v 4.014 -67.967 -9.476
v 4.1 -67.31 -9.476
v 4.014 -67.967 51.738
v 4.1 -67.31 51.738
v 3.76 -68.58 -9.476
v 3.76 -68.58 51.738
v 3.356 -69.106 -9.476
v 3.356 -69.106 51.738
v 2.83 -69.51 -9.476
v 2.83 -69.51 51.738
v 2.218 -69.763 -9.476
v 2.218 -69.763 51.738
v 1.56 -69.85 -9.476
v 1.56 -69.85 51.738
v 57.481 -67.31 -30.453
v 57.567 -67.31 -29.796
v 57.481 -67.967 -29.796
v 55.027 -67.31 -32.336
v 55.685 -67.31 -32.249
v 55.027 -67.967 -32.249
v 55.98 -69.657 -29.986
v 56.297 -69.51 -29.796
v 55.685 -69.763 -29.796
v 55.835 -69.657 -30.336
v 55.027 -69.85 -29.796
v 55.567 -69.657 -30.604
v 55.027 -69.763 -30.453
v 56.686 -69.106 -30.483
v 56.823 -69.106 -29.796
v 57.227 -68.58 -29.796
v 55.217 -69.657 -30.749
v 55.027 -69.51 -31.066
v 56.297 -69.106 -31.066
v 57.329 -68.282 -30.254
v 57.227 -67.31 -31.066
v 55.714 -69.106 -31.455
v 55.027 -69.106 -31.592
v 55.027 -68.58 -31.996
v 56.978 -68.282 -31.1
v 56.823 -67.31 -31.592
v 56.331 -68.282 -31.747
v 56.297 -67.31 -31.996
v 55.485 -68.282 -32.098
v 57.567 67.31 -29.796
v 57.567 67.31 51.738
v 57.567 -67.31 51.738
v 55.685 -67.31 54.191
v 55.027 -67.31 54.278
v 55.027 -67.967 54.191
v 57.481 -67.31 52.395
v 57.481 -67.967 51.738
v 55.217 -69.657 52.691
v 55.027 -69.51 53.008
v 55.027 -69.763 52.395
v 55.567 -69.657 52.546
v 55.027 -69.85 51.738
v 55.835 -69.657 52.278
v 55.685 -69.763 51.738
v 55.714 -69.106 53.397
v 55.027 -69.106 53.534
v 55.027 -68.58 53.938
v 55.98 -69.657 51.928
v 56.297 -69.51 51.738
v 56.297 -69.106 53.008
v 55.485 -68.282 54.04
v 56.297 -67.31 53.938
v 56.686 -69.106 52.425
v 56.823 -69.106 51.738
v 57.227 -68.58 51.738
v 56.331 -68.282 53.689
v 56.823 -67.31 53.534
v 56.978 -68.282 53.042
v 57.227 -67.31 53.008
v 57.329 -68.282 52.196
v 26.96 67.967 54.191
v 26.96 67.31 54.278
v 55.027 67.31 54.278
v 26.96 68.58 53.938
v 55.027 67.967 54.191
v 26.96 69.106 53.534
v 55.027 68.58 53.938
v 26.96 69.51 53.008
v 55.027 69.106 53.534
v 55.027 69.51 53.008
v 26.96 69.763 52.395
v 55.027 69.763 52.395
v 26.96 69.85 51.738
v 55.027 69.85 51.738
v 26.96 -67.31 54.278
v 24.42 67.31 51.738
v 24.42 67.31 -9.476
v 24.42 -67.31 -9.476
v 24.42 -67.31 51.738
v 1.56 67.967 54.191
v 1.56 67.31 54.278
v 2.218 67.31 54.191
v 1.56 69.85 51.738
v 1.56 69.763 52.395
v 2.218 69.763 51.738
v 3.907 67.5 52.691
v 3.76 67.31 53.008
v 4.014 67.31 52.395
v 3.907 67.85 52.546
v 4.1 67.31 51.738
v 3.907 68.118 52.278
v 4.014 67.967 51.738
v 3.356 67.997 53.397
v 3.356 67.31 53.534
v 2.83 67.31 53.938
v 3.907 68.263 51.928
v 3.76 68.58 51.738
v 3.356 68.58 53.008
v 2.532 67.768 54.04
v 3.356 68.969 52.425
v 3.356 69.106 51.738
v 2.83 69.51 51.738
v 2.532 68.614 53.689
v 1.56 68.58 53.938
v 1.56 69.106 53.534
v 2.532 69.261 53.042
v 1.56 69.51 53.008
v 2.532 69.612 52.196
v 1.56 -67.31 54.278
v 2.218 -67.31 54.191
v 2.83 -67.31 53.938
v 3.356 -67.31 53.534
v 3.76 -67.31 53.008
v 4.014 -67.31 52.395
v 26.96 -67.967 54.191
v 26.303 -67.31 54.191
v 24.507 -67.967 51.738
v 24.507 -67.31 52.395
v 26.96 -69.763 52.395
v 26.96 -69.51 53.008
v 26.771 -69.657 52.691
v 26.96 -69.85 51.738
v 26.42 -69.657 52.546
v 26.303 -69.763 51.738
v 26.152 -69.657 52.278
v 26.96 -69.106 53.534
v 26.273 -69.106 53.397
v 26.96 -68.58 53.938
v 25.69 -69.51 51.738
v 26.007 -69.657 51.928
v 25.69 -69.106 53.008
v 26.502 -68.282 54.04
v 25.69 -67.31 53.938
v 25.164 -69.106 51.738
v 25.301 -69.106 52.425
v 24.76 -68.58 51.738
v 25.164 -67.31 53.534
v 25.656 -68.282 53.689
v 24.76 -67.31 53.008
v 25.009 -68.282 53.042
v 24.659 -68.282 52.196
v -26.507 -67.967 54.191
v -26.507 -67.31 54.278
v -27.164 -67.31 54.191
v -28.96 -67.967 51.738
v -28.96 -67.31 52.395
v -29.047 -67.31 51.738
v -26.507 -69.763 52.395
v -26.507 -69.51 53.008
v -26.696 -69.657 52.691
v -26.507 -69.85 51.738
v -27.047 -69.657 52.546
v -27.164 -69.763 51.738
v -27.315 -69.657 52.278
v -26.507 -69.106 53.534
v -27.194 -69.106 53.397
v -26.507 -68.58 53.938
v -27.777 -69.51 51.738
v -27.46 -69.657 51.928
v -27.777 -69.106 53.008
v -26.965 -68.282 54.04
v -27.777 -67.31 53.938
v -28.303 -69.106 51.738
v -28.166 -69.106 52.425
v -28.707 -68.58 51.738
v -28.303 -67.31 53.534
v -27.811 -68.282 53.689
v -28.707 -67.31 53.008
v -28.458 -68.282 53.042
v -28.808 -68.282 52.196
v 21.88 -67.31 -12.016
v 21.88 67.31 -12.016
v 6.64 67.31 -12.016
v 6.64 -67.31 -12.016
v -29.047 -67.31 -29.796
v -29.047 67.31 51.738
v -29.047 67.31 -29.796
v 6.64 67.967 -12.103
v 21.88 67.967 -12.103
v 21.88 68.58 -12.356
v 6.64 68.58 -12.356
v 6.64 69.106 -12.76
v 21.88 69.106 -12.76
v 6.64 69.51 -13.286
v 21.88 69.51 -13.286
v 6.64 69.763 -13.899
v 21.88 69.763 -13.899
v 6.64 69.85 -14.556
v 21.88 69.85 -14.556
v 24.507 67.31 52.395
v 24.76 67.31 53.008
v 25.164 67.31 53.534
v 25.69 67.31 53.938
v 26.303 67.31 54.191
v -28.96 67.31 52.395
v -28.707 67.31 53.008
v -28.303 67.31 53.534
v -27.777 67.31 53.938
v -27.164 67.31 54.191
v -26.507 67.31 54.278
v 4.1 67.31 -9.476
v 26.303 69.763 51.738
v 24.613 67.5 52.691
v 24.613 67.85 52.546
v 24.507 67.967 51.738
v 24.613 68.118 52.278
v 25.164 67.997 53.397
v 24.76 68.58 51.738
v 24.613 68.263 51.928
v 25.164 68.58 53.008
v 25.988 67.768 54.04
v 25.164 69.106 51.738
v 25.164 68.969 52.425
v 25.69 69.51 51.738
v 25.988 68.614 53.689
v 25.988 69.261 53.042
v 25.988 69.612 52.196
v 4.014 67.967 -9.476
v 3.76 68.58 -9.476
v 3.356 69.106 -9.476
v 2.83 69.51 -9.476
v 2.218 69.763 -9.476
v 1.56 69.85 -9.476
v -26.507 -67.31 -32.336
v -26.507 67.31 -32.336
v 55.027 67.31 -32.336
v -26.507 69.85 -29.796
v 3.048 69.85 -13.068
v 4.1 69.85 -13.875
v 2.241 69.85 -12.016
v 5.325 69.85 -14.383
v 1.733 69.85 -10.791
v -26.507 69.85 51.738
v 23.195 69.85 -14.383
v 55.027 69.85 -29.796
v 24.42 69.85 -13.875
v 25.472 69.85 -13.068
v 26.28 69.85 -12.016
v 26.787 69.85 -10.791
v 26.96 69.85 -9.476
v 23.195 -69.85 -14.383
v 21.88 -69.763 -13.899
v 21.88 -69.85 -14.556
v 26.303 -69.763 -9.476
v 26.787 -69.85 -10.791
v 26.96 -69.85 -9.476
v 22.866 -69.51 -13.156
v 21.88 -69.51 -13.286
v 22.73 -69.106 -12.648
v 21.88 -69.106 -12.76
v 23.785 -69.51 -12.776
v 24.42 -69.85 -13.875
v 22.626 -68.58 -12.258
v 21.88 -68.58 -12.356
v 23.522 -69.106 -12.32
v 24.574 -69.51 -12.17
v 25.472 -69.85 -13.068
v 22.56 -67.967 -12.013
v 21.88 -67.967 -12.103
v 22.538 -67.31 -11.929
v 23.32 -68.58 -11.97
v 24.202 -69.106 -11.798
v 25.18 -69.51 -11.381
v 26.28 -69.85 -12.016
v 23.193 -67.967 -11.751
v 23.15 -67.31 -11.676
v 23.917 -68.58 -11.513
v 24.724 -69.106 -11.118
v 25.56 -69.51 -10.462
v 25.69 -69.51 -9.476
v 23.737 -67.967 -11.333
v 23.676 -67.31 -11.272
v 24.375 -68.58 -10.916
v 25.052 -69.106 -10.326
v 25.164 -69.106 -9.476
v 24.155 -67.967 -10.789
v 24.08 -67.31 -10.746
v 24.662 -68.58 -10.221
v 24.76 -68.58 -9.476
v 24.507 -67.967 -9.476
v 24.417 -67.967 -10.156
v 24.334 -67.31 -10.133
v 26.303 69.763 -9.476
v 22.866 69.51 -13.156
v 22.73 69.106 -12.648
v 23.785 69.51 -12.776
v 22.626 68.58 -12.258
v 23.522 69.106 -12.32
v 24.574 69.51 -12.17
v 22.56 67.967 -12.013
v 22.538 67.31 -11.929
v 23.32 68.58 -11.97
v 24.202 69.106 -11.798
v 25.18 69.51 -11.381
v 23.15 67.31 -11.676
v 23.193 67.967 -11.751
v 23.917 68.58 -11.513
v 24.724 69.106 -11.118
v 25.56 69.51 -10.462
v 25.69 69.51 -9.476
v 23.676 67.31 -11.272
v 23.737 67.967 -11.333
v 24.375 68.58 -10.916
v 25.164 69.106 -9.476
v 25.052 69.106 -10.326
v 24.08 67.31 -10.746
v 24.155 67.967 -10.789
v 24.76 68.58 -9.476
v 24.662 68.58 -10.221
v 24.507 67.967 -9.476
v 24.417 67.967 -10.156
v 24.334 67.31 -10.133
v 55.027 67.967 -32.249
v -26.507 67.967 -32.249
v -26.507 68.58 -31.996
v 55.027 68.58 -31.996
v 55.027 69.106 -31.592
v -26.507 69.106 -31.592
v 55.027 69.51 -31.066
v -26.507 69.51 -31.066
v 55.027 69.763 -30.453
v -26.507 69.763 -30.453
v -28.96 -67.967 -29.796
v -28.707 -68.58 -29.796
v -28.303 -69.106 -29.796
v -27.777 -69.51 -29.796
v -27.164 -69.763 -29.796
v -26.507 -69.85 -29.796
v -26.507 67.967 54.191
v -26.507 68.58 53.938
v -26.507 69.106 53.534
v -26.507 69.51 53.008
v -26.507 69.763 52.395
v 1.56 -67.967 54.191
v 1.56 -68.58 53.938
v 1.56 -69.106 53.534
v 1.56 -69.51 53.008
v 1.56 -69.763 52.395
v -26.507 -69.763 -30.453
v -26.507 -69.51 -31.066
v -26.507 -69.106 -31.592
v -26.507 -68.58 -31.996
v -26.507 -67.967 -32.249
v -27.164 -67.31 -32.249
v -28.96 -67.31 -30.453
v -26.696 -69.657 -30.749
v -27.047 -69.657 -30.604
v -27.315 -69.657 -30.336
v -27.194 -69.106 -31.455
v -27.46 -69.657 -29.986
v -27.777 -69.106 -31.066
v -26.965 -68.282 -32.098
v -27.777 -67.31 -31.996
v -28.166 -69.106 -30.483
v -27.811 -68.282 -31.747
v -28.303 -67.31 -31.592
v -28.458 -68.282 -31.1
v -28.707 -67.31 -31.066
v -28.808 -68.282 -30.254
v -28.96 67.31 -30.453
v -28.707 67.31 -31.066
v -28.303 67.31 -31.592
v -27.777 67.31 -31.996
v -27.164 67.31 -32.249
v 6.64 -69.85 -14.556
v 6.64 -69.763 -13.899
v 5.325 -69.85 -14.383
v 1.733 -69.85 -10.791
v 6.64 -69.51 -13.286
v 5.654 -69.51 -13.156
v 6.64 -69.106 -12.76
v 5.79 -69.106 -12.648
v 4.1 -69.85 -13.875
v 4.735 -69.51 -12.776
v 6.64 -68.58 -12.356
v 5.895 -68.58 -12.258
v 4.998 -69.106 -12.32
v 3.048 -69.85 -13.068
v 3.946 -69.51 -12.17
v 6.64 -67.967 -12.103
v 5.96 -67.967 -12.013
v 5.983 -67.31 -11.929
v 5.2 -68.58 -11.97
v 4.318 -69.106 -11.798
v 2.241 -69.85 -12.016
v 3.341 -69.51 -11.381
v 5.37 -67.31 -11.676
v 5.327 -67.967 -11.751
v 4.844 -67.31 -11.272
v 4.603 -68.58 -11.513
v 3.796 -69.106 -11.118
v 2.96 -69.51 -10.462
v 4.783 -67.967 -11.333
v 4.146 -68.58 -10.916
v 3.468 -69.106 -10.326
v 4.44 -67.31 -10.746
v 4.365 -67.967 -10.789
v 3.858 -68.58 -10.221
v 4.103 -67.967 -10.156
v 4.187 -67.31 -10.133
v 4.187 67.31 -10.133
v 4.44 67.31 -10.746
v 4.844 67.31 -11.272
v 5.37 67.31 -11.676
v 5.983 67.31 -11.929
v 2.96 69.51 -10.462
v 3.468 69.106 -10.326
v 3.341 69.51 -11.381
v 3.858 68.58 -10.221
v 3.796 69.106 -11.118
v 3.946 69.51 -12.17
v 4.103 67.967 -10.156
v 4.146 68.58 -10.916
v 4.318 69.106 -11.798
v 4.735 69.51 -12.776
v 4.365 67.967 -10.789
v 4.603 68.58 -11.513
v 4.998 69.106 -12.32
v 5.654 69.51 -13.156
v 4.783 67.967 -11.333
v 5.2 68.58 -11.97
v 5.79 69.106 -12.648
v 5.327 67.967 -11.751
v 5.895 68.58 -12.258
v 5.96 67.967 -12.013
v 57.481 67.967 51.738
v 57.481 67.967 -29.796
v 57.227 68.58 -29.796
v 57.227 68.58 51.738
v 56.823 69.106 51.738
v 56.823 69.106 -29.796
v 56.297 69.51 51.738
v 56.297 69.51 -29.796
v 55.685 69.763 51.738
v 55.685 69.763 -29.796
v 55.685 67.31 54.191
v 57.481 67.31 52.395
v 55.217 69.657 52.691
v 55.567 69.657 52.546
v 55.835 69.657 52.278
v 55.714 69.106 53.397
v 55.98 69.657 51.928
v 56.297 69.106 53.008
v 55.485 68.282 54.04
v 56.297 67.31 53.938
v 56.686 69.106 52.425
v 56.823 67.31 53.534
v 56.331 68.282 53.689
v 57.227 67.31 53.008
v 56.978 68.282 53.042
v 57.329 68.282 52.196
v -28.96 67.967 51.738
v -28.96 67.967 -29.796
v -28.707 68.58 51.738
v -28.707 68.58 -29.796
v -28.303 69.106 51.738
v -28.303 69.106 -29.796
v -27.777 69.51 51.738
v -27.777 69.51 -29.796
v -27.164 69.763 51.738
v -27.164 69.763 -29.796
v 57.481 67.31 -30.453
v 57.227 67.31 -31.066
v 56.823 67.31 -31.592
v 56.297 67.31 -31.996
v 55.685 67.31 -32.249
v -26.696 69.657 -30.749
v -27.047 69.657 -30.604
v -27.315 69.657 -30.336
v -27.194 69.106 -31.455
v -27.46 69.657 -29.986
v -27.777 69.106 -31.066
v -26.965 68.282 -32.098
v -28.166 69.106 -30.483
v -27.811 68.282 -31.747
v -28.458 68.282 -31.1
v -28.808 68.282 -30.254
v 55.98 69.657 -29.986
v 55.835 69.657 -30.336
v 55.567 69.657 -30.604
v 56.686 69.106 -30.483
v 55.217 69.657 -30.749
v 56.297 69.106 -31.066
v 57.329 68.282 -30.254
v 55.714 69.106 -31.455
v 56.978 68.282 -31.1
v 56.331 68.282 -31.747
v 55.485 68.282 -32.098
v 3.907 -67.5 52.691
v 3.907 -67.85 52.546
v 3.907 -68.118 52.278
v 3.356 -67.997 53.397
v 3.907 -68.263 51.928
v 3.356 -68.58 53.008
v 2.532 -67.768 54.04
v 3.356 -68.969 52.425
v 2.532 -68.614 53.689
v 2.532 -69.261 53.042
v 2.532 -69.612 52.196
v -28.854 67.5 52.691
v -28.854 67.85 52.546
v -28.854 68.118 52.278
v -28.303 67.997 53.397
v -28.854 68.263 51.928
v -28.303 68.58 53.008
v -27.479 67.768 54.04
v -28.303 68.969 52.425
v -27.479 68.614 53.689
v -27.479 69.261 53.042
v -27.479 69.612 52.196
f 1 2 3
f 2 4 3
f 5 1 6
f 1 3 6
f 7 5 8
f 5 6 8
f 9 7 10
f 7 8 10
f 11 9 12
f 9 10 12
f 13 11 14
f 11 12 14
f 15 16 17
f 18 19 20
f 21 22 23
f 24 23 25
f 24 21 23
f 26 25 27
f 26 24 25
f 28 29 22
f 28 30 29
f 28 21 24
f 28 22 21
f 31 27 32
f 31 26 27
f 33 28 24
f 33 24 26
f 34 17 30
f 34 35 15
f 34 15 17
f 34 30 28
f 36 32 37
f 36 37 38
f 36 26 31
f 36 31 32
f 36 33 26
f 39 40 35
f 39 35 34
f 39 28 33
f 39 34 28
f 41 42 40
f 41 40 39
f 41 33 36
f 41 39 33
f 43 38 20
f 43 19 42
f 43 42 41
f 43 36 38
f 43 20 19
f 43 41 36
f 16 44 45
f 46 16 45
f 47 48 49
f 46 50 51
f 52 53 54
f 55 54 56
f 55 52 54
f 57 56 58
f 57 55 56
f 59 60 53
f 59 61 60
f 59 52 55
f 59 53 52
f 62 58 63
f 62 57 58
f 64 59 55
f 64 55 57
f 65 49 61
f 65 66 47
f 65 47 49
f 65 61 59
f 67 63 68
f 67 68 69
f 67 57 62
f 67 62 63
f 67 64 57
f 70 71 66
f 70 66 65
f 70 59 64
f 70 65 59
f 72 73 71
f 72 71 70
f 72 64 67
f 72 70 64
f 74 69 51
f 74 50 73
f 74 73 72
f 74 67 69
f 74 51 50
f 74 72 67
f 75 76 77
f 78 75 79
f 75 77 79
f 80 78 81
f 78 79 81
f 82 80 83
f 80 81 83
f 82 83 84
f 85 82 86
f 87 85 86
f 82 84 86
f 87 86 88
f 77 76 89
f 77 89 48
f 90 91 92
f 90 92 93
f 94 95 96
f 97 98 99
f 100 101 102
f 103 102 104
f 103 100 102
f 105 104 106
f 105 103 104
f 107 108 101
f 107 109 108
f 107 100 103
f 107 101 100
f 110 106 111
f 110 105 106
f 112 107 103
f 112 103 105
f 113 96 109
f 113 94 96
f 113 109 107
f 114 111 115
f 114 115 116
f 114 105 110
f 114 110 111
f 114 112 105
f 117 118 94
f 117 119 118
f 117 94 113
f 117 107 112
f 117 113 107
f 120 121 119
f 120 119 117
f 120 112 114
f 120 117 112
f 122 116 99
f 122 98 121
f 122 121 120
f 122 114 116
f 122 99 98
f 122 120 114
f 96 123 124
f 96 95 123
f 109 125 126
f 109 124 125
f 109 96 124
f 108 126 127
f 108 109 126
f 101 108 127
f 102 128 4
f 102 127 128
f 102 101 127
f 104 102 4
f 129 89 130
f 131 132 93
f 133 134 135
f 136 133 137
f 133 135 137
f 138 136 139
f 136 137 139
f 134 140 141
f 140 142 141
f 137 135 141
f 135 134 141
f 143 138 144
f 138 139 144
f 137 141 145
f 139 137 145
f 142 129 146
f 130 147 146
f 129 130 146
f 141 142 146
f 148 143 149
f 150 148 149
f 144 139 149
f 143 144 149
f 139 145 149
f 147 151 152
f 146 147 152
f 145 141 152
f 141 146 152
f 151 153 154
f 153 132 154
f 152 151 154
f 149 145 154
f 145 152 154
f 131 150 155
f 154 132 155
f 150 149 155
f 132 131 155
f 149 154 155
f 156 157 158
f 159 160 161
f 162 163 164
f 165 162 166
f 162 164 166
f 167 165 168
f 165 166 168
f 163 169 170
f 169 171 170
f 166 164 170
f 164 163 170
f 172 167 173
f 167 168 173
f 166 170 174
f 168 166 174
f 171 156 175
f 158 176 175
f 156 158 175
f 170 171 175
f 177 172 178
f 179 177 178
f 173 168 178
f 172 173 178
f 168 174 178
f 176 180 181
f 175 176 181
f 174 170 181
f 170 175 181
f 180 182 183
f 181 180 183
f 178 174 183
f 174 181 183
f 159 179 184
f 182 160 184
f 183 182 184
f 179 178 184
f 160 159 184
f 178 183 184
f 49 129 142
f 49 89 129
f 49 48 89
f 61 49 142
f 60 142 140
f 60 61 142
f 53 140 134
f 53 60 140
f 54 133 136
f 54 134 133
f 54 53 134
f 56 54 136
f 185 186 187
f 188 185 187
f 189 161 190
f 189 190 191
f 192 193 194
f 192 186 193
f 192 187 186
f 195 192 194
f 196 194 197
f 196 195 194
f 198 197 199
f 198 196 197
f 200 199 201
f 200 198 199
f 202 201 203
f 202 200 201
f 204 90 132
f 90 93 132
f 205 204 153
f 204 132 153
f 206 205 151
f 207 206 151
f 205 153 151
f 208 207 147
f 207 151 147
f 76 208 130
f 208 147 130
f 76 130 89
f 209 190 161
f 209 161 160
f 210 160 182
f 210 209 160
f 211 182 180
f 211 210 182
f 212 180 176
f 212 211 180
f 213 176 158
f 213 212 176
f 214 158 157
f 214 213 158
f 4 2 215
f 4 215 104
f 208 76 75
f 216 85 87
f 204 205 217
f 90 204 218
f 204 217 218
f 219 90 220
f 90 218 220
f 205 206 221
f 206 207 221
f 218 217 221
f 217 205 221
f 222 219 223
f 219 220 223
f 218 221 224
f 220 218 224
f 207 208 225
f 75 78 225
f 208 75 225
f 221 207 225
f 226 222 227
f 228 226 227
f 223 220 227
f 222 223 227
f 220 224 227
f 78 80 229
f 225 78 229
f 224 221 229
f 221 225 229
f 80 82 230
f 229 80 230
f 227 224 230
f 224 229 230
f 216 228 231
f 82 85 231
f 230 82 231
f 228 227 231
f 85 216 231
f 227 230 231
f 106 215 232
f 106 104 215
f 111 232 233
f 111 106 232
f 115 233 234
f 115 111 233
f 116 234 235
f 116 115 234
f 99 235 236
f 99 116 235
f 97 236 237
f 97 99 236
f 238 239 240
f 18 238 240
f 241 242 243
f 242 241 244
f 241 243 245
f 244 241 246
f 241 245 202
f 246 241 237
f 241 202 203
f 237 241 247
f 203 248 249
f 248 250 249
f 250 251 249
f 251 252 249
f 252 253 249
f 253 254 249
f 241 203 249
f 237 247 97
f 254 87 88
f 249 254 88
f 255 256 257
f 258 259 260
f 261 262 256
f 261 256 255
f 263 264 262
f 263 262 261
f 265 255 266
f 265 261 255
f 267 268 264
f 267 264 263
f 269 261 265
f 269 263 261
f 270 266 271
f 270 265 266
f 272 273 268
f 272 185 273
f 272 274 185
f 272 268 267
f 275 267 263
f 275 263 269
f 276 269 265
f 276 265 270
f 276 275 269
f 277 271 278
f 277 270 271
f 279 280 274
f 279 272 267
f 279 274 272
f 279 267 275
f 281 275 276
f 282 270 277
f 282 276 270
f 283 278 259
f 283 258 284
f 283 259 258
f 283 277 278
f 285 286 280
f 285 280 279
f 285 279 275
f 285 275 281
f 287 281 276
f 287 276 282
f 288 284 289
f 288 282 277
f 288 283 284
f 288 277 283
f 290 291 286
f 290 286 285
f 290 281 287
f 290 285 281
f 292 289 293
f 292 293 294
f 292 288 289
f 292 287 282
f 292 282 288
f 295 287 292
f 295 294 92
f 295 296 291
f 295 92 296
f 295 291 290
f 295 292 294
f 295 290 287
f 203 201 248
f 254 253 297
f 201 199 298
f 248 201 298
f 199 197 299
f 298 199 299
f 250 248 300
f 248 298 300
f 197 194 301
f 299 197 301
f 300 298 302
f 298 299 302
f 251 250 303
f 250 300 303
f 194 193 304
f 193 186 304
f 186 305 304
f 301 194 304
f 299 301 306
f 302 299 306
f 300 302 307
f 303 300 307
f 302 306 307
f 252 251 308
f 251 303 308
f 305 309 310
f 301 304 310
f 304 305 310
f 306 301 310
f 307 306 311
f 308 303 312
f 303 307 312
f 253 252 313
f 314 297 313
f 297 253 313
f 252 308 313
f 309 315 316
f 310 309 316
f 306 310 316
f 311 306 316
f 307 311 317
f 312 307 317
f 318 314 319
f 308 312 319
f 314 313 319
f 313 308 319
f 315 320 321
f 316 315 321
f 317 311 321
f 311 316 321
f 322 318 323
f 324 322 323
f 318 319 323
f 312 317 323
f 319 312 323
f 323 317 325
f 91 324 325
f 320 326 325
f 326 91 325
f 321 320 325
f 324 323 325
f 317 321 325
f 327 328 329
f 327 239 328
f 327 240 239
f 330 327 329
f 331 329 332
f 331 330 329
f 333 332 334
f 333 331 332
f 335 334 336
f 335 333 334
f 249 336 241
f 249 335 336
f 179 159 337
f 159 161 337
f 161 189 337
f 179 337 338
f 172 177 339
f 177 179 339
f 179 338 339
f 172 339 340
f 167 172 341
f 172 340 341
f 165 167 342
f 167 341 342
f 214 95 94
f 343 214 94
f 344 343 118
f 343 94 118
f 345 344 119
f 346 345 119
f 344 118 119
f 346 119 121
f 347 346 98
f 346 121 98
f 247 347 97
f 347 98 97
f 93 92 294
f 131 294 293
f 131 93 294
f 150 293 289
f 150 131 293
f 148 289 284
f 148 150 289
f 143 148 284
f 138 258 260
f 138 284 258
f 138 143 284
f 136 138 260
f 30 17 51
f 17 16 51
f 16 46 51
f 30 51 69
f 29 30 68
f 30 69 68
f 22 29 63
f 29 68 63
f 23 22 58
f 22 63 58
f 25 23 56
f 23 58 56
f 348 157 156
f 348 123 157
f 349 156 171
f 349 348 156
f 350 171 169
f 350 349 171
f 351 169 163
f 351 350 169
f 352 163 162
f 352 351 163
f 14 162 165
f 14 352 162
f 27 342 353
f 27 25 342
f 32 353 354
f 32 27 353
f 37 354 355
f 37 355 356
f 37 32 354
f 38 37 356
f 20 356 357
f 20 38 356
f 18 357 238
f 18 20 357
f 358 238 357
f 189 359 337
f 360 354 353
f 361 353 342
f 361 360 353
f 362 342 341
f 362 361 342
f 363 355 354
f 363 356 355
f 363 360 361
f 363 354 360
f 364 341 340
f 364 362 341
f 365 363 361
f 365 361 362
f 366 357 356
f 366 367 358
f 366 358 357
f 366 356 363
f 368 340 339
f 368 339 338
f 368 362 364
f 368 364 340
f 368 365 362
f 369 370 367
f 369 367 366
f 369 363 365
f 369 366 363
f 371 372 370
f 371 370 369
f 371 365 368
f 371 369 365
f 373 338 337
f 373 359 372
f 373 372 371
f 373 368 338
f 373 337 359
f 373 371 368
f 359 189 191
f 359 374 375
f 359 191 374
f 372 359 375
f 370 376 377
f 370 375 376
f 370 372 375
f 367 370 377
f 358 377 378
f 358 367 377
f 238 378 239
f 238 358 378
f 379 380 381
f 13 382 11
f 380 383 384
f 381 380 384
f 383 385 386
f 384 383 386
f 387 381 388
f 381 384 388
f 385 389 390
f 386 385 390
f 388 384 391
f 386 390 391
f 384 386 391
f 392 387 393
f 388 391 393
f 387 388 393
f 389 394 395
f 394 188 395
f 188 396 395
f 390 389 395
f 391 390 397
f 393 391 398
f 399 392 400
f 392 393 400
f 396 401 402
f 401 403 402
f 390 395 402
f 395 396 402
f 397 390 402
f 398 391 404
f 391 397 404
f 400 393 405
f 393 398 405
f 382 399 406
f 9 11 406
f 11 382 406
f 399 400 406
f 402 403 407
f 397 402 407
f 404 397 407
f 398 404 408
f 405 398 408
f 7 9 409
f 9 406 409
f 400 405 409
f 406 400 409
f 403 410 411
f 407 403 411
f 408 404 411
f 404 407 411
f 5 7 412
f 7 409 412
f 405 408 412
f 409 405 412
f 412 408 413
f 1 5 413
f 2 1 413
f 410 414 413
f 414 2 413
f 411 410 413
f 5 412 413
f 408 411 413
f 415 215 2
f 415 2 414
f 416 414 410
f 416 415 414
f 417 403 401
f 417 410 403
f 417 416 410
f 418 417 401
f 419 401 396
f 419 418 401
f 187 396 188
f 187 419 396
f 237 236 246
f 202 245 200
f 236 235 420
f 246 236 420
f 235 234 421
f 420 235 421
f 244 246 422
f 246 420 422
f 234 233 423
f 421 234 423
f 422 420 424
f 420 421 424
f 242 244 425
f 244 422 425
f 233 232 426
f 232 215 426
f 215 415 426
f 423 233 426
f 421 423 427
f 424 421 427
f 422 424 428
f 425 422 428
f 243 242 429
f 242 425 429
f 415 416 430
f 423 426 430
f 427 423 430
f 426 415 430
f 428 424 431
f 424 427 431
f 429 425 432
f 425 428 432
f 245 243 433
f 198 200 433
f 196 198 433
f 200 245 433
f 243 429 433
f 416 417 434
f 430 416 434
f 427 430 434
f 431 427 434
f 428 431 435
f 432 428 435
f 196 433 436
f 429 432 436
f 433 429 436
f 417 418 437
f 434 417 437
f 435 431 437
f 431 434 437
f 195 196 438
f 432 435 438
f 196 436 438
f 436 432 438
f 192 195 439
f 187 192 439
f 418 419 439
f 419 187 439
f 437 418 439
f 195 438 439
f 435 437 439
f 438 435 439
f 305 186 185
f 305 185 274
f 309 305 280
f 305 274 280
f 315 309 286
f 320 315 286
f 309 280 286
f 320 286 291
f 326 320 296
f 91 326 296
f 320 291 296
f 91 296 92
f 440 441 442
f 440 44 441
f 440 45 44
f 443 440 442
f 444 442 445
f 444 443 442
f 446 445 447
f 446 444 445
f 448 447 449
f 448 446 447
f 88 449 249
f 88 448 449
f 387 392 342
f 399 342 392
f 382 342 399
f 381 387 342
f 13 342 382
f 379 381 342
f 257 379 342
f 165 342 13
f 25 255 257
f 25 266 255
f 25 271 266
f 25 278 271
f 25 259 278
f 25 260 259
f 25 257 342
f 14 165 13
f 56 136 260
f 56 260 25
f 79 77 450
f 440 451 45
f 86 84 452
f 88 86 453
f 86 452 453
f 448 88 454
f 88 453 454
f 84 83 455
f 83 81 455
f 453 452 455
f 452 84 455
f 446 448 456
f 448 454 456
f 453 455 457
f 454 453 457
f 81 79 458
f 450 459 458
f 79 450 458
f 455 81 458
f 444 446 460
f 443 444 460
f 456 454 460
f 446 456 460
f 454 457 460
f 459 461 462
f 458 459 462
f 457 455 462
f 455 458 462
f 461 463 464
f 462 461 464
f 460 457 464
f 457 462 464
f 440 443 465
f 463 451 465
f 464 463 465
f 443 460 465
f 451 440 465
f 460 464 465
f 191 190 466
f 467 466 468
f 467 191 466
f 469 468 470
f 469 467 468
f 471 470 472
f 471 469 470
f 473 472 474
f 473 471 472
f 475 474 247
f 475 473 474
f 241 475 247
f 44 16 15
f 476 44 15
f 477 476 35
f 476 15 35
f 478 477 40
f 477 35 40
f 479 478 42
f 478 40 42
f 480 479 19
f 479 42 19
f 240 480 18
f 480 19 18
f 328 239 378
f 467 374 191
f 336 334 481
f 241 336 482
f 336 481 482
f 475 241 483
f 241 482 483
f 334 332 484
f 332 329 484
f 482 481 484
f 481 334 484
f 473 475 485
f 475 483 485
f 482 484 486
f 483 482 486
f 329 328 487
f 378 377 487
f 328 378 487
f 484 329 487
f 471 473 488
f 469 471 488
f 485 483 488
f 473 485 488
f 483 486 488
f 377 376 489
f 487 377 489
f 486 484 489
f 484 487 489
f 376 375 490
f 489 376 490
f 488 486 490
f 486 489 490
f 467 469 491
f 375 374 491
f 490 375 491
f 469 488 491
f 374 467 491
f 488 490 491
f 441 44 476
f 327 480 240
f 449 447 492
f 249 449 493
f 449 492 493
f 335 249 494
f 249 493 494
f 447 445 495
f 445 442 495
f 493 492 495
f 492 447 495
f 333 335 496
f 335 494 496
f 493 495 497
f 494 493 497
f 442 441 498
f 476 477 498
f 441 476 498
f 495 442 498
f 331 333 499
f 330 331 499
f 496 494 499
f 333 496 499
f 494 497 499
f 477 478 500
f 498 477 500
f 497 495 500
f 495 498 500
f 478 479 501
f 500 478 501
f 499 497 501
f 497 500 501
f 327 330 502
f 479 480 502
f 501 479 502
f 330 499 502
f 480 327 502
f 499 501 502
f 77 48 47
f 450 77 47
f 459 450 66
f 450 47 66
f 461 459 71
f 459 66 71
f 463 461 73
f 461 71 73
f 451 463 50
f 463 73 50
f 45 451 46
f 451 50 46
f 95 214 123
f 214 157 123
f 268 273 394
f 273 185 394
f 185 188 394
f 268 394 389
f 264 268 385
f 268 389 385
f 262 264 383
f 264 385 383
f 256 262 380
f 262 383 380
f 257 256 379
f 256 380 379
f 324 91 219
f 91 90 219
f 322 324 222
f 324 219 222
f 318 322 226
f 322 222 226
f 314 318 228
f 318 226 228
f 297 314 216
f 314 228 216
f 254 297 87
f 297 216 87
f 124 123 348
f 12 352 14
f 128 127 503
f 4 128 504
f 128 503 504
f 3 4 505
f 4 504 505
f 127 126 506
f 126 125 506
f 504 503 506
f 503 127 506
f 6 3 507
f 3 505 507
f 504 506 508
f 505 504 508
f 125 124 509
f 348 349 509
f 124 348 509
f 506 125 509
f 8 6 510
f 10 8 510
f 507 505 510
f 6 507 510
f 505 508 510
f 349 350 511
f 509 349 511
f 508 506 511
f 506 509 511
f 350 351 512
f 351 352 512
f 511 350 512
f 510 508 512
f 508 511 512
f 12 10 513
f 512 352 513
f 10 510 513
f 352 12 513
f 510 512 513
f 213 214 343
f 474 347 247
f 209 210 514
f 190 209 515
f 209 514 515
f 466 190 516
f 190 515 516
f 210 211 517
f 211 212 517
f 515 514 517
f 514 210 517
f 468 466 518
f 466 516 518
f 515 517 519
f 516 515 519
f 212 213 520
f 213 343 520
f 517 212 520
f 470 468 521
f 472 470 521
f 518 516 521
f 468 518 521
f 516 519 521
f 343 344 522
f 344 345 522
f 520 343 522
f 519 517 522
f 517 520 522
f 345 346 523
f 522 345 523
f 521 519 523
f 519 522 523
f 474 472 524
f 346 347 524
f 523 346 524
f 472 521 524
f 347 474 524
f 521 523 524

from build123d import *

# Parameters (mm, degrees)
F0_W     = 33.147
F0_H     = 66.294
F1_DEPTH = 69.85
F2_R     = 2.54


with BuildPart() as f1:
    # F0 (on Front) → F1 (new body, symmetric)
    with BuildSketch(Plane.XZ):
        with Locations((-12.4733666049, 21.13100771)):
            Rectangle(F0_W, F0_H)
        Polygon((57.5671333951, -32.33599229), (57.5671333951, -12.01599229), (24.4201333951, -12.01599229), (4.1001333951, -12.01599229), (-29.0468666049, -12.01599229), (-29.0468666049, -32.33599229), align=None)
        with Locations((40.9936333951, 21.13100771)):
            Rectangle(F0_W, F0_H)
    extrude(amount=F1_DEPTH, both=True)

    # F2
    f2_edges = [f1.edges().sort_by_distance(p)[0] for p in [
        (-12.473367, 69.85, 54.278008),
        (-29.046867, 0, 54.278008),
        (-12.473367, -69.85, 54.278008),
        (4.100133, 0, 54.278008),
        (57.567133, 0, 54.278008),
        (40.993633, 69.85, 54.278008),
        (24.420133, 0, 54.278008),
        (40.993633, -69.85, 54.278008),
        (57.567133, 0, -32.335992),
        (57.567133, 69.85, 10.971008),
        (57.567133, -69.85, 10.971008),
        (24.420133, 0, -12.015992),
        (14.260133, 69.85, -12.015992),
        (4.100133, 0, -12.015992),
        (14.260133, -69.85, -12.015992),
        (4.100133, 69.85, 21.131008),
        (4.100133, -69.85, 21.131008),
        (-29.046867, 0, -32.335992),
        (14.260133, 69.85, -32.335992),
        (14.260133, -69.85, -32.335992),
        (-29.046867, 69.85, 10.971008),
        (-29.046867, -69.85, 10.971008),
        (24.420133, 69.85, 21.131008),
        (24.420133, -69.85, 21.131008),
    ]]
    fillet(f2_edges, radius=F2_R)


solid = f1.part
